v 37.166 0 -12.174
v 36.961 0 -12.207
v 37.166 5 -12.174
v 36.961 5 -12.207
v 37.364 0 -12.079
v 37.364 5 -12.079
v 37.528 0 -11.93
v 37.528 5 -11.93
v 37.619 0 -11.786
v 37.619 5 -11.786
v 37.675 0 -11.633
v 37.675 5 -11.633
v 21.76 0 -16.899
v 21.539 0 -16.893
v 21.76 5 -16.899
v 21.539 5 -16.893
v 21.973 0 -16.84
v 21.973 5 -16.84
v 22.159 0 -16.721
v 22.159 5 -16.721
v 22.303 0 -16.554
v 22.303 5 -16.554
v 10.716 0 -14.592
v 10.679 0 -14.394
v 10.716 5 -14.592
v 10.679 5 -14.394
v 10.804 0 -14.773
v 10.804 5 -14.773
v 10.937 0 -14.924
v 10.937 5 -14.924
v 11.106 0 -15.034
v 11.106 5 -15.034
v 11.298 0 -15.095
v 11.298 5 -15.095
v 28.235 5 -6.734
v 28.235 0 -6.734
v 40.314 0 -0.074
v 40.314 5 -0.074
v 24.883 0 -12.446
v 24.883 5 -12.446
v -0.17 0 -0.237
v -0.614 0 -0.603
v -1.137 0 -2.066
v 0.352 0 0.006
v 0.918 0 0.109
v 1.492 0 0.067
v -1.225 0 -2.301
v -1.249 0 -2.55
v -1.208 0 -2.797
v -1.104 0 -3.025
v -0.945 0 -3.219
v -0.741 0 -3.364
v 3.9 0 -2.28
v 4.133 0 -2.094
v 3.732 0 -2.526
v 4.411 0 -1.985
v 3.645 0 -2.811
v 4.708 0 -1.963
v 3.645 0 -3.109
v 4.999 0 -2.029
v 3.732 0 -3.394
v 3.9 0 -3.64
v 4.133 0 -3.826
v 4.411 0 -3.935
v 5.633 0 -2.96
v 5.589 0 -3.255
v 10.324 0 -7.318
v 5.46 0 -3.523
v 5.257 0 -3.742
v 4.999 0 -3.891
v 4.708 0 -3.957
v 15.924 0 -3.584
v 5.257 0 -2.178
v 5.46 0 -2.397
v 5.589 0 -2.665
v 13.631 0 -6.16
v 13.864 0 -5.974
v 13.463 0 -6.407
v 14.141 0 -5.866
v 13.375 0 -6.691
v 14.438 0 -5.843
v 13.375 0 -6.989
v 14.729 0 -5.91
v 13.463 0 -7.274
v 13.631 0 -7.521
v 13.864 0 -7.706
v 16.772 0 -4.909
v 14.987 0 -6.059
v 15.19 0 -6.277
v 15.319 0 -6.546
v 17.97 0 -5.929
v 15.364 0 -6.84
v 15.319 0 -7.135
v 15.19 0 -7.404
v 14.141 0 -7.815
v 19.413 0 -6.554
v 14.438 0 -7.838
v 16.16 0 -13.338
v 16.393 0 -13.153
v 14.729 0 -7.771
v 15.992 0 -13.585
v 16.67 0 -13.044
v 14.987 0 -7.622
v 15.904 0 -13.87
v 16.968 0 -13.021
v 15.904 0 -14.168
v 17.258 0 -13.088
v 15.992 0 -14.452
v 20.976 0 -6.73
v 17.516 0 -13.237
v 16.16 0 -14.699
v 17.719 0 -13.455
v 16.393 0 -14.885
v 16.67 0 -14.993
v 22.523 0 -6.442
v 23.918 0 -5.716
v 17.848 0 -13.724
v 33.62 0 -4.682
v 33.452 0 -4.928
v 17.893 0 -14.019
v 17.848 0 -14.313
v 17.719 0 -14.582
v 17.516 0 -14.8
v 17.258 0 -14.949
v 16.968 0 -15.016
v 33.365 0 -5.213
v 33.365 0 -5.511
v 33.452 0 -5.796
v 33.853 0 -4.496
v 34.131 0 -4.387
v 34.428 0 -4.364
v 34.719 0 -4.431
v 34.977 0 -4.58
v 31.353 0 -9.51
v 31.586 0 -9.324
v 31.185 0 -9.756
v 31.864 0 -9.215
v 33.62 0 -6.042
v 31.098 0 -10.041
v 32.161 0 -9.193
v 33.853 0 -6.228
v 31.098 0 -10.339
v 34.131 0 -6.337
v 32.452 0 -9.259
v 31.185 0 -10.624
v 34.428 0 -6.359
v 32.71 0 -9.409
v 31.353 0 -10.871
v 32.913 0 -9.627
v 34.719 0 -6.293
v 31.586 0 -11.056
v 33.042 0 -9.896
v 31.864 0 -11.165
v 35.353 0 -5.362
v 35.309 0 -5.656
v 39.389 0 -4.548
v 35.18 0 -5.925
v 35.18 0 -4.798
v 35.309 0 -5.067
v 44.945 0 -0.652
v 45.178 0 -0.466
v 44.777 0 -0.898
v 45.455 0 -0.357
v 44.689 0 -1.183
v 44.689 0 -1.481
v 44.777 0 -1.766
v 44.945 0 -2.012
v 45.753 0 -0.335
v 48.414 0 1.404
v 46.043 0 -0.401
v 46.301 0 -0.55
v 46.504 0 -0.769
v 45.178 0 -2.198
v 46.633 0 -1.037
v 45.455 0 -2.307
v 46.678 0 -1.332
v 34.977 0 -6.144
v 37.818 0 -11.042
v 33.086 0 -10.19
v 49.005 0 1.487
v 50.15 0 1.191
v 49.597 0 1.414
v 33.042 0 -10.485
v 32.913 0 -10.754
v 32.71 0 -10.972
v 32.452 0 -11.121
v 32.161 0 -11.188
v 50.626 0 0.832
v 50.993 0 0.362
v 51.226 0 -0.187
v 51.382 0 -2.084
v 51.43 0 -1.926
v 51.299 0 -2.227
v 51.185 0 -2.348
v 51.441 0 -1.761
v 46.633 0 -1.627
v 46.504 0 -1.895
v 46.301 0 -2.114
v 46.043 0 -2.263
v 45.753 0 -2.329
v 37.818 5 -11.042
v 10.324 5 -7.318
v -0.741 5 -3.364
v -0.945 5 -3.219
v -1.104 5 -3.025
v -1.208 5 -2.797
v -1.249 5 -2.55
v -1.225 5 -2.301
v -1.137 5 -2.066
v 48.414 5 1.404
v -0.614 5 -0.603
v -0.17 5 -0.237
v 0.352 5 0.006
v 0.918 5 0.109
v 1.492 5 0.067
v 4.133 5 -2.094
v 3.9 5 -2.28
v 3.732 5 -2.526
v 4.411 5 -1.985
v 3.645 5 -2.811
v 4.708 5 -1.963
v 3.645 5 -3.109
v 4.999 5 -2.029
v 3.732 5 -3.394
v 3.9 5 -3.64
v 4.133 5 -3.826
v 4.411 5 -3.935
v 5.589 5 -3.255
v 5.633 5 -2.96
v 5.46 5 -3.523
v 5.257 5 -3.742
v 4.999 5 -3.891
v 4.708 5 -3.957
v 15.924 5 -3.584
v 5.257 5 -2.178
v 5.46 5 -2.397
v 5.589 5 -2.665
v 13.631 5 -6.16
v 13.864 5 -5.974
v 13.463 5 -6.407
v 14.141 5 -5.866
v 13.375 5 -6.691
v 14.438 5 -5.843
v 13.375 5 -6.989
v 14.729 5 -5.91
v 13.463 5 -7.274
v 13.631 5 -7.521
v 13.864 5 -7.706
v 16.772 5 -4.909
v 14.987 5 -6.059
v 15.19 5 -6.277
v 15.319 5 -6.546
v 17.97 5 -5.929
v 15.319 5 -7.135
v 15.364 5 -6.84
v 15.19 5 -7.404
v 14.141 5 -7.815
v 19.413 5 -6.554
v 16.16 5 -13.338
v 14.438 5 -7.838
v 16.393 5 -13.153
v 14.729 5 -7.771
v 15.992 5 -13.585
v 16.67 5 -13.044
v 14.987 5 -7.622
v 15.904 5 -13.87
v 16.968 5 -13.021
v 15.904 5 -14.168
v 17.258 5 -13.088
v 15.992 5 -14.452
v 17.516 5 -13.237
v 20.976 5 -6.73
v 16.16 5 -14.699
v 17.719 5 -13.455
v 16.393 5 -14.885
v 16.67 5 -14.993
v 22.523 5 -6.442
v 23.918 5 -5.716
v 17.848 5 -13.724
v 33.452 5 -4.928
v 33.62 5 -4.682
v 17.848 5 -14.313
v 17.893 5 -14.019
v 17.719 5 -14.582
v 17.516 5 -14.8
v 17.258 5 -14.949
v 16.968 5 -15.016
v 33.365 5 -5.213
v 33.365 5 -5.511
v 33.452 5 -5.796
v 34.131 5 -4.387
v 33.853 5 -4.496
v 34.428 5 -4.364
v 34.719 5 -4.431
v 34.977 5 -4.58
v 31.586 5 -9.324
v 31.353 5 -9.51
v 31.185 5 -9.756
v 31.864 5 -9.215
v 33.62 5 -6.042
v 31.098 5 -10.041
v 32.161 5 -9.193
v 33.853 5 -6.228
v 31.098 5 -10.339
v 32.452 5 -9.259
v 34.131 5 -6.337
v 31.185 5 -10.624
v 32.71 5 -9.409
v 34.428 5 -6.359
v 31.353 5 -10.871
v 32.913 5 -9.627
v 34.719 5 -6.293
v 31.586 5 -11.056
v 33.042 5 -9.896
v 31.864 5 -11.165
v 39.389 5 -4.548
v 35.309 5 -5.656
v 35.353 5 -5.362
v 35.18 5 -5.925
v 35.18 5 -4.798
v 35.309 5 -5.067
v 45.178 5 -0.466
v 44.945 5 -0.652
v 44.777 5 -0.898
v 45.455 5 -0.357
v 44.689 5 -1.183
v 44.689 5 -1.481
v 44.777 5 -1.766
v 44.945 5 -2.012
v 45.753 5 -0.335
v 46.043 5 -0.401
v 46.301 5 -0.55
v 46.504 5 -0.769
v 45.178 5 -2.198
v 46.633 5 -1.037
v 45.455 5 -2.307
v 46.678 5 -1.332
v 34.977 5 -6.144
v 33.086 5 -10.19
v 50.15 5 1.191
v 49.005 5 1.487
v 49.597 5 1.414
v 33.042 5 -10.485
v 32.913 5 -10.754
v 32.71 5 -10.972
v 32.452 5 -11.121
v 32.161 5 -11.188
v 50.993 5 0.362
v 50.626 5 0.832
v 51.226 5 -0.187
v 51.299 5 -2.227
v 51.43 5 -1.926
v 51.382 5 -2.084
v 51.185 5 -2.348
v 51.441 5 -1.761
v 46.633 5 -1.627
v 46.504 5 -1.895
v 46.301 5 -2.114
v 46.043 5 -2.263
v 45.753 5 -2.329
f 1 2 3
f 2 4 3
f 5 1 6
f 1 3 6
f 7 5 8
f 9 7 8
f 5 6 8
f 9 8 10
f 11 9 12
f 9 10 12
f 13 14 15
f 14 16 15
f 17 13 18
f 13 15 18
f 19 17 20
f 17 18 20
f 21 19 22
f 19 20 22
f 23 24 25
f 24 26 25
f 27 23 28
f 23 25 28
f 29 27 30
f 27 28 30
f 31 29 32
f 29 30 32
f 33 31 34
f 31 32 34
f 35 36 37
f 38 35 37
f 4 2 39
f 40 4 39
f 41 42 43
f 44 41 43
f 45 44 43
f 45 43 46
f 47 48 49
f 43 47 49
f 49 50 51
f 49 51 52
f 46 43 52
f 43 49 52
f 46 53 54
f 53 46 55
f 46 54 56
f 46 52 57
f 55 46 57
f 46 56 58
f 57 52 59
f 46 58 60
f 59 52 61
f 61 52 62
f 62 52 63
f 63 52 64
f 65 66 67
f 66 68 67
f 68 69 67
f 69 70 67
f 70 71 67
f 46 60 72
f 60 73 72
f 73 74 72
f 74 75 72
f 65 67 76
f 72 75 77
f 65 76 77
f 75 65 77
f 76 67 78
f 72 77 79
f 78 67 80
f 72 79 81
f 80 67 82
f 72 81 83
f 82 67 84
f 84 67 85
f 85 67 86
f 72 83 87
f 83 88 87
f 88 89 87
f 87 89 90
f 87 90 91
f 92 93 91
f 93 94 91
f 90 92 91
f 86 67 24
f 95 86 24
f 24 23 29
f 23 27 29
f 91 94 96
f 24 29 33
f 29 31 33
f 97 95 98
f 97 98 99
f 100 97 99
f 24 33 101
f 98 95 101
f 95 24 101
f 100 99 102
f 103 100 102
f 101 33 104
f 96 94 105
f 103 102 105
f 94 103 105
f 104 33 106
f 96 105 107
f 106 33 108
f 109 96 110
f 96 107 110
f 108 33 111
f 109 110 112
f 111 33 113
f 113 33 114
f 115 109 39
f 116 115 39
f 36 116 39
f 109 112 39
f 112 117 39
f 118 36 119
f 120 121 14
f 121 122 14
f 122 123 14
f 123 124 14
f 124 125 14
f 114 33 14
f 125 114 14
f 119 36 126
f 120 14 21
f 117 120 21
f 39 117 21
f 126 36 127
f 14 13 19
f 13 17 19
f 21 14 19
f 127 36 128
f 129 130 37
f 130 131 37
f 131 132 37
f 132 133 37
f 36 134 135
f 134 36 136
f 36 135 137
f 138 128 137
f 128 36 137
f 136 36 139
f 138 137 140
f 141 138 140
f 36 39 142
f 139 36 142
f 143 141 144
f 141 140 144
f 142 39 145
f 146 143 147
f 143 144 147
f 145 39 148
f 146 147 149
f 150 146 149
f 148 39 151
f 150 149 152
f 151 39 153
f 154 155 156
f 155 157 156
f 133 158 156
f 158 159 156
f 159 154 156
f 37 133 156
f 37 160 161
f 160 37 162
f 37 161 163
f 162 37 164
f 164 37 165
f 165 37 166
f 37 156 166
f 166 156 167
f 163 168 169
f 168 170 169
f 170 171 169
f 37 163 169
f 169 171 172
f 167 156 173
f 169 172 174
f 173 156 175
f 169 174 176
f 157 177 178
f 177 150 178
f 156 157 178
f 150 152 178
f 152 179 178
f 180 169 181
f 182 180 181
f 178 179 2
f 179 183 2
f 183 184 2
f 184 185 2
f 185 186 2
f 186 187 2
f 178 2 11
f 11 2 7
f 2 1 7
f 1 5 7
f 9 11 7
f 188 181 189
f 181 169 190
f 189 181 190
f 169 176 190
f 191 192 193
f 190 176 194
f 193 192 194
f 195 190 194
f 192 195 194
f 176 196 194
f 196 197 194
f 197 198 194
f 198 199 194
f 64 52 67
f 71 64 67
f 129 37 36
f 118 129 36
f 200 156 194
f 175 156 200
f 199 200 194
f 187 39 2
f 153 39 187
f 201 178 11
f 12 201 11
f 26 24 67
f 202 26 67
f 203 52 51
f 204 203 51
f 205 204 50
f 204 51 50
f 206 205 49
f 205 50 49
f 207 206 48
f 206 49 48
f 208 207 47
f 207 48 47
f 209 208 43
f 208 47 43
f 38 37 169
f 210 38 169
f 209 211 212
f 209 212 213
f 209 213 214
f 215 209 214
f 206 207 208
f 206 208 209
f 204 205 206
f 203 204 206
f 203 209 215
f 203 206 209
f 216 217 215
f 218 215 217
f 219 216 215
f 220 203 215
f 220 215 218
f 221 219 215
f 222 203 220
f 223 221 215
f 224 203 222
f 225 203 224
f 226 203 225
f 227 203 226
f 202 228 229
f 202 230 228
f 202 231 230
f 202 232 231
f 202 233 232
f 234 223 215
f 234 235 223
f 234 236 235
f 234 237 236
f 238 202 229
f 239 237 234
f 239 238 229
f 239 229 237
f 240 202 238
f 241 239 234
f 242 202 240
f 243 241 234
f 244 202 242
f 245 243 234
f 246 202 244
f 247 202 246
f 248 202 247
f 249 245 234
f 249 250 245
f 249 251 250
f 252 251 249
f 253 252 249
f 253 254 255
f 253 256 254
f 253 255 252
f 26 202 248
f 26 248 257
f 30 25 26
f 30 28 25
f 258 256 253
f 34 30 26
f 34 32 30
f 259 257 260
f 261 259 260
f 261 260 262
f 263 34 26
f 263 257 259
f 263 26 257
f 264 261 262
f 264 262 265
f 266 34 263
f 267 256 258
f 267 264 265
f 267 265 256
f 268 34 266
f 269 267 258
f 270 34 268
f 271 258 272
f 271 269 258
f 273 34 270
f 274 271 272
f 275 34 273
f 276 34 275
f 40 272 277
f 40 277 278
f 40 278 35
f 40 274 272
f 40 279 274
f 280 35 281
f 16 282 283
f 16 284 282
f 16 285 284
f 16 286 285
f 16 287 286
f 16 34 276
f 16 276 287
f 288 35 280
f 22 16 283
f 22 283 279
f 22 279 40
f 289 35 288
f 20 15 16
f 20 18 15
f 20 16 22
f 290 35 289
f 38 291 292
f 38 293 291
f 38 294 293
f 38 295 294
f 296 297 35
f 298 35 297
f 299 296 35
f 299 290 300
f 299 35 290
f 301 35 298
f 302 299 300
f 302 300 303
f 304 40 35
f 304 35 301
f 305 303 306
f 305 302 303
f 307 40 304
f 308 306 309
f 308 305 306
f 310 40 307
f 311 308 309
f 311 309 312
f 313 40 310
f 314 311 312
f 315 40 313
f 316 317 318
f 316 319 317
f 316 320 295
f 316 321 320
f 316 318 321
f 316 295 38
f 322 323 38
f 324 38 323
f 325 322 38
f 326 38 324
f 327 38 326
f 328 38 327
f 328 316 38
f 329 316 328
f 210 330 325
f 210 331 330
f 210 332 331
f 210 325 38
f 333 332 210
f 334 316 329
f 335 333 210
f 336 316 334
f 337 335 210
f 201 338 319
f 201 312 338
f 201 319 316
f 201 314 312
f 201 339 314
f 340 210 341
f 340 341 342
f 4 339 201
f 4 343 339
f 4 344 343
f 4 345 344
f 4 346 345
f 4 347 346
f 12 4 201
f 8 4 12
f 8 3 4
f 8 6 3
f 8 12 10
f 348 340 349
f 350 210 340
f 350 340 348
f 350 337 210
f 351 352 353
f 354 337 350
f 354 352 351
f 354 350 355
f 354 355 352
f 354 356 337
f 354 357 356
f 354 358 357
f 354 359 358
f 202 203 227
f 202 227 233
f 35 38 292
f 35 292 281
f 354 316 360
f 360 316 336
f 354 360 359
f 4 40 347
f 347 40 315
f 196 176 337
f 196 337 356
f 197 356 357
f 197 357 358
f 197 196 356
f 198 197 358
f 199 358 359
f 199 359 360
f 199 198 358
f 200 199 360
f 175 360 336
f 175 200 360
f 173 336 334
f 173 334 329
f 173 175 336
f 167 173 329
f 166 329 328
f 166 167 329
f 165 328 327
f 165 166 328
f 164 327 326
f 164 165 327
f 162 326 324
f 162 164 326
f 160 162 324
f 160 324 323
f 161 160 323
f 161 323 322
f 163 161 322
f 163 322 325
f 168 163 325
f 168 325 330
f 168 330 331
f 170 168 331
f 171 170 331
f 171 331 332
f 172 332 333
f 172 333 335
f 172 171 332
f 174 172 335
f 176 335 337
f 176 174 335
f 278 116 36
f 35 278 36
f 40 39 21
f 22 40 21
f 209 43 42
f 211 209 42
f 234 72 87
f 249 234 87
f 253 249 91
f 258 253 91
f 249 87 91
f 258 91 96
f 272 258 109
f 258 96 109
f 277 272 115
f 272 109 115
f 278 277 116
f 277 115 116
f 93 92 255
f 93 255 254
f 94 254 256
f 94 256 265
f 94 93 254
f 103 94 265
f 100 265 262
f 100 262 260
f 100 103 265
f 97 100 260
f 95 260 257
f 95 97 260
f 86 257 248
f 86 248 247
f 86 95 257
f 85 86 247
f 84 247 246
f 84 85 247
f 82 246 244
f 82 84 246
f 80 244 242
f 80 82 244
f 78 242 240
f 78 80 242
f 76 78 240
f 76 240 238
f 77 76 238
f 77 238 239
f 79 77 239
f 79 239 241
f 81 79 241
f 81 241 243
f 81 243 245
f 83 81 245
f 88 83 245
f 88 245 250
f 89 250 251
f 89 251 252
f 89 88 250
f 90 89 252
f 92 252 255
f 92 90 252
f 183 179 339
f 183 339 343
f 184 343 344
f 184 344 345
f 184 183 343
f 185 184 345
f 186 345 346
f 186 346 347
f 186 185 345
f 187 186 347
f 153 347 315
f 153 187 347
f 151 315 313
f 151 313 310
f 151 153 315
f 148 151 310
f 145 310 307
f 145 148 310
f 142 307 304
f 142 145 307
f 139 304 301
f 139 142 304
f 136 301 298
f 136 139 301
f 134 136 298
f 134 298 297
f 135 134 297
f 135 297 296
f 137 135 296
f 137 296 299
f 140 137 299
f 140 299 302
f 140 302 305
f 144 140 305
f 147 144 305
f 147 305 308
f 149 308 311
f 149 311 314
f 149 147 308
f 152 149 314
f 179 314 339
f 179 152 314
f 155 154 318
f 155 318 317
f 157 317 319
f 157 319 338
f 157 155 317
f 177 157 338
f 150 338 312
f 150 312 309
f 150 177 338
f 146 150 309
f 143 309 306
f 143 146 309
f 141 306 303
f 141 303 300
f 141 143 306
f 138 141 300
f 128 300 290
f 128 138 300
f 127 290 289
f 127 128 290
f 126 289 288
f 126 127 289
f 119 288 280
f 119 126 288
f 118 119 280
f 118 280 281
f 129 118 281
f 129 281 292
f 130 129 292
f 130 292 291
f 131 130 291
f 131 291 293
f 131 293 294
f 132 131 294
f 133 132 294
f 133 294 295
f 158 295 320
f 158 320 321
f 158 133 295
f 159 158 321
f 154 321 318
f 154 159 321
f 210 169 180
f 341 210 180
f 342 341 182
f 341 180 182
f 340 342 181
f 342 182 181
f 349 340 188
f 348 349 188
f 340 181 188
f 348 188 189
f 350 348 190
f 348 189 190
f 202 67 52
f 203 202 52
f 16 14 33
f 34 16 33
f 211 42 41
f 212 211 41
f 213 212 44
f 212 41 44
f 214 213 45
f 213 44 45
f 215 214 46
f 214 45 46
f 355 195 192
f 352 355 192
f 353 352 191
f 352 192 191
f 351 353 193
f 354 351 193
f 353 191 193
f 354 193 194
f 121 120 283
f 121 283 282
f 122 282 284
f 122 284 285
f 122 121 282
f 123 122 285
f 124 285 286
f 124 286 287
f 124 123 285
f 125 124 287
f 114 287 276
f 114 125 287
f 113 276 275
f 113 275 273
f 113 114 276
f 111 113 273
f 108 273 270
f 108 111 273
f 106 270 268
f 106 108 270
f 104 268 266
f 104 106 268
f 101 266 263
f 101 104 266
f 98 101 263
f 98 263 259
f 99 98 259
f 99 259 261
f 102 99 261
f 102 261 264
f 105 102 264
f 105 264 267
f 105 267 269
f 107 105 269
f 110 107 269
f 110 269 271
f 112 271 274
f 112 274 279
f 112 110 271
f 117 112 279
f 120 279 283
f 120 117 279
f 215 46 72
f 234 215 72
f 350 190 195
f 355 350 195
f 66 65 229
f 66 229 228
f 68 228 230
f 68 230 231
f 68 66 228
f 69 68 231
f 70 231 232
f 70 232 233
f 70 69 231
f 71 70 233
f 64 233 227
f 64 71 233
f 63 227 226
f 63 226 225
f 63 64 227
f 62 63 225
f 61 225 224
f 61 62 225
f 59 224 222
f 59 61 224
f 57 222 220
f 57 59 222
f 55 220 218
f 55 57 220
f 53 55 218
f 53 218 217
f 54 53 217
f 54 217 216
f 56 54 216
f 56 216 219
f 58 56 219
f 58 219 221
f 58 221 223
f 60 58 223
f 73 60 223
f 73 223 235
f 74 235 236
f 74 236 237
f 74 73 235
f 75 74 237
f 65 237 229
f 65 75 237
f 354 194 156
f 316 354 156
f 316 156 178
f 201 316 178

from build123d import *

# Parameters (mm, degrees)
SKETCH1_R           = 1
BOSS_EXTRUDE2_DEPTH = 5
FILLET1_R           = 0.75


with BuildPart() as part:
    # Sketch1 → Boss-Extrude2 (new body)
    with BuildSketch(Plane(origin=(0, 0, 0), x_dir=(1, 0, 0), z_dir=(0, 1, 0))):
        with BuildLine():
            Line((-1.136805092, 2.066410525), (-0.613869143, 0.60302827))
            ThreePointArc((-0.613869143, 0.60302827), (0.35214746, -0.005581798), (1.492263995, -0.066643898))
            Line((1.492263995, -0.066643898), (15.923799424, 3.58412039))
            ThreePointArc((15.923799424, 3.58412039), (19.413112634, 6.553816474), (23.917744363, 5.715547725))
            Line((23.917744363, 5.715547725), (28.235048802, 6.73364228))
            Line((28.235048802, 6.73364228), (40.313961493, 0.074349637))
            Line((40.313961493, 0.074349637), (48.41423182, -1.403905787))
            ThreePointArc((48.41423182, -1.403905787), (50.149589372, -1.191061521), (51.226168842, 0.186525195))
            Line((51.226168842, 0.186525195), (51.441108403, 1.760534064))
            ThreePointArc((51.441108403, 1.760534064), (51.382015555, 2.083995414), (51.185428041, 2.34757189))
            Line((51.185428041, 2.34757189), (39.388940164, 4.548224923))
            Line((39.388940164, 4.548224923), (37.817705686, 11.041835021))
            Line((37.817705686, 11.041835021), (37.66842193, 11.65879609))
            Line((37.66842193, 11.65879609), (37.488298502, 12.198995049))
            Line((37.488298502, 12.198995049), (37.342570627, 12.198995049))
            Line((37.342570627, 12.198995049), (24.882570627, 12.445855441))
            Line((24.882570627, 12.445855441), (22.035262293, 16.980664764))
            Line((22.035262293, 16.980664764), (10.708550227, 14.991797304))
            Line((10.708550227, 14.991797304), (10.323891999, 7.31840254))
            Line((10.323891999, 7.31840254), (-0.740858173, 3.364442041))
            ThreePointArc((-0.740858173, 3.364442041), (-1.207662762, 2.797429575), (-1.136805092, 2.066410525))
        make_face()
        with Locations((34.353341853, 5.361683953)):
            Circle(SKETCH1_R, mode=Mode.SUBTRACT)
        with Locations((45.677794697, 1.332114162)):
            Circle(SKETCH1_R, mode=Mode.SUBTRACT)
        with Locations((14.363757556, 6.840434301)):
            Circle(SKETCH1_R, mode=Mode.SUBTRACT)
        with Locations((32.086393371, 10.190351233)):
            Circle(SKETCH1_R, mode=Mode.SUBTRACT)
        with Locations((4.633423153, 2.960008936)):
            Circle(SKETCH1_R, mode=Mode.SUBTRACT)
        with Locations((16.892865834, 14.018563944)):
            Circle(SKETCH1_R, mode=Mode.SUBTRACT)
    extrude(amount=BOSS_EXTRUDE2_DEPTH)

    # Fillet1
    fillet1_edges = [part.edges().sort_by_distance(p)[0] for p in [
        (37.488298502, 2.5, -12.198995049),
        (22.035262293, 2.5, -16.980664764),
        (10.708550227, 2.5, -14.991797304),
    ]]
    fillet(fillet1_edges, radius=FILLET1_R)


solid = part.part
